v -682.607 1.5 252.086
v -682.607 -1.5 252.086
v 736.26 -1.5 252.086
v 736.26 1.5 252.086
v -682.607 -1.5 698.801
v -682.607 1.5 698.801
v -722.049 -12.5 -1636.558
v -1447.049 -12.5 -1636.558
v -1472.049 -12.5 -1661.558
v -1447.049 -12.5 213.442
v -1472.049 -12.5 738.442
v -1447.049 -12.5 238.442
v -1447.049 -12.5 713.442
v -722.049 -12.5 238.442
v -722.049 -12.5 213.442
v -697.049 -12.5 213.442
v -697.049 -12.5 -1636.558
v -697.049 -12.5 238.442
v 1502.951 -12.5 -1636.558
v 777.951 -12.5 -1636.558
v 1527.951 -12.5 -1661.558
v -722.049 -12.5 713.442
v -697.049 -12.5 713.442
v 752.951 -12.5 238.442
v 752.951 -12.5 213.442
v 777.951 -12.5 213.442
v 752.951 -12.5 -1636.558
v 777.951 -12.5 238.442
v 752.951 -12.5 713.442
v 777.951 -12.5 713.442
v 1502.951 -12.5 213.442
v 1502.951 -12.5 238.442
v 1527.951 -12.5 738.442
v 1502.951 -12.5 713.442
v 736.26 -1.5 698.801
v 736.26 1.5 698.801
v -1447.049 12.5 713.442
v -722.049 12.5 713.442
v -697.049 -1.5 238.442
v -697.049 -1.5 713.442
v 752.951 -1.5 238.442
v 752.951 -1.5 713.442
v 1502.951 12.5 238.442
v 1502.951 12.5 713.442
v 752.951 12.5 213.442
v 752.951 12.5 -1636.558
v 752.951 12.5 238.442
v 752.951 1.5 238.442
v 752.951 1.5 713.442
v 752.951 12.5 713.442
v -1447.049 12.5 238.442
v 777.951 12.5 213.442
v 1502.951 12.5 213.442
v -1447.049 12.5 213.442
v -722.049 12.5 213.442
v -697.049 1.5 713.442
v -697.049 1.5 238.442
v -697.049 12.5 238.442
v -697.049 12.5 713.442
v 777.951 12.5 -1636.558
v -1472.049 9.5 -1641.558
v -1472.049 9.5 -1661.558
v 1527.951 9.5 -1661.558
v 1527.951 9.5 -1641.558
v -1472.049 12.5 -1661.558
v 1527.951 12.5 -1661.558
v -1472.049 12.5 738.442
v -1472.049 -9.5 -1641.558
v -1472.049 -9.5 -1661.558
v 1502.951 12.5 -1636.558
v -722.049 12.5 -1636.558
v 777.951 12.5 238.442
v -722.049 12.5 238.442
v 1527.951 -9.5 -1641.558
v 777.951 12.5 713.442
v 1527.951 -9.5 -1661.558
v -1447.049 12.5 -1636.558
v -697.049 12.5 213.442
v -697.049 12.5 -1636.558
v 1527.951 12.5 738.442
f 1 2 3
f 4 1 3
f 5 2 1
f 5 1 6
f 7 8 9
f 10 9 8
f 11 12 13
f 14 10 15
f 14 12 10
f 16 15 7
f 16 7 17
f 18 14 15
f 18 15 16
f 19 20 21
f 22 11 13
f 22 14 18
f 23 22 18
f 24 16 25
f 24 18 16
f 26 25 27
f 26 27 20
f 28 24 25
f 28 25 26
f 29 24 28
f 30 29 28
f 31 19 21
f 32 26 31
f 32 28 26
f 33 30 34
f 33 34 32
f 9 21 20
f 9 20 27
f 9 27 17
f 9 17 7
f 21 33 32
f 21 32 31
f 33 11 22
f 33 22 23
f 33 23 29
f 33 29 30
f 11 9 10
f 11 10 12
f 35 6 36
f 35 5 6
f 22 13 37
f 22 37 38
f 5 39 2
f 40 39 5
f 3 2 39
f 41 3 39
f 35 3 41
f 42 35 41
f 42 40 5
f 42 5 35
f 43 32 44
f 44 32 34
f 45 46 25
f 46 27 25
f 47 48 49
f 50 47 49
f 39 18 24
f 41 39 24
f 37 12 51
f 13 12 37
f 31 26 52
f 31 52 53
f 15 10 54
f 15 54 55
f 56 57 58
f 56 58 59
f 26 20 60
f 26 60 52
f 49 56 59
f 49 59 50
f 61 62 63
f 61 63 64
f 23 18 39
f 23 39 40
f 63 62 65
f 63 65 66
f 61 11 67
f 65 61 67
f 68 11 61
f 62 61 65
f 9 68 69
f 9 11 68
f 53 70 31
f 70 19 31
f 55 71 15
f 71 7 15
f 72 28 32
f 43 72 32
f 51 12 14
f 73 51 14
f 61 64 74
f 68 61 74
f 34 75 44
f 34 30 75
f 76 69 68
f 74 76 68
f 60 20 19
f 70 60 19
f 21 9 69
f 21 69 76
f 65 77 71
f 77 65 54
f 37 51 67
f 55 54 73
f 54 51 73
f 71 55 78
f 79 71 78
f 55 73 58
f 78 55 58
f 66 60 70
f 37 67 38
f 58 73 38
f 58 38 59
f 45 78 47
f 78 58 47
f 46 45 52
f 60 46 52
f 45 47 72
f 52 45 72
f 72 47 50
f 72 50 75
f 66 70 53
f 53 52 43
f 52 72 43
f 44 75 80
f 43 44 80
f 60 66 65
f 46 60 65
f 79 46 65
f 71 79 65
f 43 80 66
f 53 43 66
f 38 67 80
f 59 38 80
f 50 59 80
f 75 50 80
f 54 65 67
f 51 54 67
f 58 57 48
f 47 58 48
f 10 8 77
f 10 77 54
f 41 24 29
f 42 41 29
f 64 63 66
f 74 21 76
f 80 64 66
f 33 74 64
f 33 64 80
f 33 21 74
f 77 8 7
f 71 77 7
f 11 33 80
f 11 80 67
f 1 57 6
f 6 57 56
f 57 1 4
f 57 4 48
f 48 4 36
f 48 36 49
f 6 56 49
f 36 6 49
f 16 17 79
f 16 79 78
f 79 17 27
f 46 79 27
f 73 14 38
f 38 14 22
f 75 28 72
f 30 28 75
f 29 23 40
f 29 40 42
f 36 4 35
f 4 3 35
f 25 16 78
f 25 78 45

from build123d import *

# Parameters (mm, degrees)
F0_W     = 725
F0_H     = 1850
F0_W_2   = 1450
F0_H_2   = 475
F1_DEPTH = 12.5
F2_DEPTH = 12.5
F3_W     = 19
F3_H     = 20
F4_DEPTH = 3000
F5_W     = 4.999995
F5_H     = 486.715336
F5_W_2   = 1453.866918
F5_W_3   = 1418.866913
F5_H_2   = 446.715336
F6_DEPTH = 1.5


with BuildPart() as f1:
    # F0 (on Front) → F1 (new body, symmetric)
    with BuildSketch(Plane.XZ):
        Polygon((-1472.048871, 238.441594), (-1472.048871, -1661.558406), (1527.951129, -1661.558406), (1527.951129, 738.441594), (752.951129, 738.441594), (-697.048871, 738.441594), (-1472.048871, 738.441594), align=None)
        with Locations((-1084.548871, -711.558406)):
            Rectangle(F0_W, F0_H, mode=Mode.SUBTRACT)
        with Locations((27.951129, -711.558406)):
            Rectangle(F0_W_2, F0_H, mode=Mode.SUBTRACT)
        with Locations((1140.451129, -711.558406)):
            Rectangle(F0_W, F0_H, mode=Mode.SUBTRACT)
        with Locations((-1084.548871, 475.941594)):
            Rectangle(F0_W, F0_H_2, mode=Mode.SUBTRACT)
        with Locations((27.951129, 475.941594)):
            Rectangle(F0_W_2, F0_H_2, mode=Mode.SUBTRACT)
        with Locations((1140.451129, 475.941594)):
            Rectangle(F0_W, F0_H_2, mode=Mode.SUBTRACT)
    extrude(amount=F1_DEPTH, both=True)

    # F0 (on Front) → F2 (join, symmetric)
    with BuildSketch(Plane.XZ):
        Polygon((-1472.048871, 238.441594), (-1472.048871, -1661.558406), (1527.951129, -1661.558406), (1527.951129, 738.441594), (752.951129, 738.441594), (-697.048871, 738.441594), (-1472.048871, 738.441594), align=None)
        with Locations((-1084.548871, -711.558406)):
            Rectangle(F0_W, F0_H, mode=Mode.SUBTRACT)
        with Locations((27.951129, -711.558406)):
            Rectangle(F0_W_2, F0_H, mode=Mode.SUBTRACT)
        with Locations((1140.451129, -711.558406)):
            Rectangle(F0_W, F0_H, mode=Mode.SUBTRACT)
        with Locations((-1084.548871, 475.941594)):
            Rectangle(F0_W, F0_H_2, mode=Mode.SUBTRACT)
        with Locations((27.951129, 475.941594)):
            Rectangle(F0_W_2, F0_H_2, mode=Mode.SUBTRACT)
        with Locations((1140.451129, 475.941594)):
            Rectangle(F0_W, F0_H_2, mode=Mode.SUBTRACT)
    extrude(amount=F2_DEPTH, both=True)

    # F3 (on face) → F4 (cut, through all)
    with BuildSketch(Plane(origin=(-1472.048871, 0, 0), x_dir=(0, -1, 0), z_dir=(-1, 0, 0))):
        with Locations((0, -1651.558406)):
            Rectangle(F3_W, F3_H)
    extrude(amount=-F4_DEPTH, mode=Mode.SUBTRACT)

    # F5 (on Front) → F6 (join, symmetric)
    with BuildSketch(Plane.XZ):
        with Locations((-700.107395, 475.443611)):
            Rectangle(F5_W, F5_H)
        with Locations((29.326061, 475.443611)):
            Rectangle(F5_W_2, F5_H)
        with Locations((26.826063, 475.443611)):
            Rectangle(F5_W_3, F5_H_2, mode=Mode.SUBTRACT)
    extrude(amount=F6_DEPTH, both=True)


solid = f1.part
